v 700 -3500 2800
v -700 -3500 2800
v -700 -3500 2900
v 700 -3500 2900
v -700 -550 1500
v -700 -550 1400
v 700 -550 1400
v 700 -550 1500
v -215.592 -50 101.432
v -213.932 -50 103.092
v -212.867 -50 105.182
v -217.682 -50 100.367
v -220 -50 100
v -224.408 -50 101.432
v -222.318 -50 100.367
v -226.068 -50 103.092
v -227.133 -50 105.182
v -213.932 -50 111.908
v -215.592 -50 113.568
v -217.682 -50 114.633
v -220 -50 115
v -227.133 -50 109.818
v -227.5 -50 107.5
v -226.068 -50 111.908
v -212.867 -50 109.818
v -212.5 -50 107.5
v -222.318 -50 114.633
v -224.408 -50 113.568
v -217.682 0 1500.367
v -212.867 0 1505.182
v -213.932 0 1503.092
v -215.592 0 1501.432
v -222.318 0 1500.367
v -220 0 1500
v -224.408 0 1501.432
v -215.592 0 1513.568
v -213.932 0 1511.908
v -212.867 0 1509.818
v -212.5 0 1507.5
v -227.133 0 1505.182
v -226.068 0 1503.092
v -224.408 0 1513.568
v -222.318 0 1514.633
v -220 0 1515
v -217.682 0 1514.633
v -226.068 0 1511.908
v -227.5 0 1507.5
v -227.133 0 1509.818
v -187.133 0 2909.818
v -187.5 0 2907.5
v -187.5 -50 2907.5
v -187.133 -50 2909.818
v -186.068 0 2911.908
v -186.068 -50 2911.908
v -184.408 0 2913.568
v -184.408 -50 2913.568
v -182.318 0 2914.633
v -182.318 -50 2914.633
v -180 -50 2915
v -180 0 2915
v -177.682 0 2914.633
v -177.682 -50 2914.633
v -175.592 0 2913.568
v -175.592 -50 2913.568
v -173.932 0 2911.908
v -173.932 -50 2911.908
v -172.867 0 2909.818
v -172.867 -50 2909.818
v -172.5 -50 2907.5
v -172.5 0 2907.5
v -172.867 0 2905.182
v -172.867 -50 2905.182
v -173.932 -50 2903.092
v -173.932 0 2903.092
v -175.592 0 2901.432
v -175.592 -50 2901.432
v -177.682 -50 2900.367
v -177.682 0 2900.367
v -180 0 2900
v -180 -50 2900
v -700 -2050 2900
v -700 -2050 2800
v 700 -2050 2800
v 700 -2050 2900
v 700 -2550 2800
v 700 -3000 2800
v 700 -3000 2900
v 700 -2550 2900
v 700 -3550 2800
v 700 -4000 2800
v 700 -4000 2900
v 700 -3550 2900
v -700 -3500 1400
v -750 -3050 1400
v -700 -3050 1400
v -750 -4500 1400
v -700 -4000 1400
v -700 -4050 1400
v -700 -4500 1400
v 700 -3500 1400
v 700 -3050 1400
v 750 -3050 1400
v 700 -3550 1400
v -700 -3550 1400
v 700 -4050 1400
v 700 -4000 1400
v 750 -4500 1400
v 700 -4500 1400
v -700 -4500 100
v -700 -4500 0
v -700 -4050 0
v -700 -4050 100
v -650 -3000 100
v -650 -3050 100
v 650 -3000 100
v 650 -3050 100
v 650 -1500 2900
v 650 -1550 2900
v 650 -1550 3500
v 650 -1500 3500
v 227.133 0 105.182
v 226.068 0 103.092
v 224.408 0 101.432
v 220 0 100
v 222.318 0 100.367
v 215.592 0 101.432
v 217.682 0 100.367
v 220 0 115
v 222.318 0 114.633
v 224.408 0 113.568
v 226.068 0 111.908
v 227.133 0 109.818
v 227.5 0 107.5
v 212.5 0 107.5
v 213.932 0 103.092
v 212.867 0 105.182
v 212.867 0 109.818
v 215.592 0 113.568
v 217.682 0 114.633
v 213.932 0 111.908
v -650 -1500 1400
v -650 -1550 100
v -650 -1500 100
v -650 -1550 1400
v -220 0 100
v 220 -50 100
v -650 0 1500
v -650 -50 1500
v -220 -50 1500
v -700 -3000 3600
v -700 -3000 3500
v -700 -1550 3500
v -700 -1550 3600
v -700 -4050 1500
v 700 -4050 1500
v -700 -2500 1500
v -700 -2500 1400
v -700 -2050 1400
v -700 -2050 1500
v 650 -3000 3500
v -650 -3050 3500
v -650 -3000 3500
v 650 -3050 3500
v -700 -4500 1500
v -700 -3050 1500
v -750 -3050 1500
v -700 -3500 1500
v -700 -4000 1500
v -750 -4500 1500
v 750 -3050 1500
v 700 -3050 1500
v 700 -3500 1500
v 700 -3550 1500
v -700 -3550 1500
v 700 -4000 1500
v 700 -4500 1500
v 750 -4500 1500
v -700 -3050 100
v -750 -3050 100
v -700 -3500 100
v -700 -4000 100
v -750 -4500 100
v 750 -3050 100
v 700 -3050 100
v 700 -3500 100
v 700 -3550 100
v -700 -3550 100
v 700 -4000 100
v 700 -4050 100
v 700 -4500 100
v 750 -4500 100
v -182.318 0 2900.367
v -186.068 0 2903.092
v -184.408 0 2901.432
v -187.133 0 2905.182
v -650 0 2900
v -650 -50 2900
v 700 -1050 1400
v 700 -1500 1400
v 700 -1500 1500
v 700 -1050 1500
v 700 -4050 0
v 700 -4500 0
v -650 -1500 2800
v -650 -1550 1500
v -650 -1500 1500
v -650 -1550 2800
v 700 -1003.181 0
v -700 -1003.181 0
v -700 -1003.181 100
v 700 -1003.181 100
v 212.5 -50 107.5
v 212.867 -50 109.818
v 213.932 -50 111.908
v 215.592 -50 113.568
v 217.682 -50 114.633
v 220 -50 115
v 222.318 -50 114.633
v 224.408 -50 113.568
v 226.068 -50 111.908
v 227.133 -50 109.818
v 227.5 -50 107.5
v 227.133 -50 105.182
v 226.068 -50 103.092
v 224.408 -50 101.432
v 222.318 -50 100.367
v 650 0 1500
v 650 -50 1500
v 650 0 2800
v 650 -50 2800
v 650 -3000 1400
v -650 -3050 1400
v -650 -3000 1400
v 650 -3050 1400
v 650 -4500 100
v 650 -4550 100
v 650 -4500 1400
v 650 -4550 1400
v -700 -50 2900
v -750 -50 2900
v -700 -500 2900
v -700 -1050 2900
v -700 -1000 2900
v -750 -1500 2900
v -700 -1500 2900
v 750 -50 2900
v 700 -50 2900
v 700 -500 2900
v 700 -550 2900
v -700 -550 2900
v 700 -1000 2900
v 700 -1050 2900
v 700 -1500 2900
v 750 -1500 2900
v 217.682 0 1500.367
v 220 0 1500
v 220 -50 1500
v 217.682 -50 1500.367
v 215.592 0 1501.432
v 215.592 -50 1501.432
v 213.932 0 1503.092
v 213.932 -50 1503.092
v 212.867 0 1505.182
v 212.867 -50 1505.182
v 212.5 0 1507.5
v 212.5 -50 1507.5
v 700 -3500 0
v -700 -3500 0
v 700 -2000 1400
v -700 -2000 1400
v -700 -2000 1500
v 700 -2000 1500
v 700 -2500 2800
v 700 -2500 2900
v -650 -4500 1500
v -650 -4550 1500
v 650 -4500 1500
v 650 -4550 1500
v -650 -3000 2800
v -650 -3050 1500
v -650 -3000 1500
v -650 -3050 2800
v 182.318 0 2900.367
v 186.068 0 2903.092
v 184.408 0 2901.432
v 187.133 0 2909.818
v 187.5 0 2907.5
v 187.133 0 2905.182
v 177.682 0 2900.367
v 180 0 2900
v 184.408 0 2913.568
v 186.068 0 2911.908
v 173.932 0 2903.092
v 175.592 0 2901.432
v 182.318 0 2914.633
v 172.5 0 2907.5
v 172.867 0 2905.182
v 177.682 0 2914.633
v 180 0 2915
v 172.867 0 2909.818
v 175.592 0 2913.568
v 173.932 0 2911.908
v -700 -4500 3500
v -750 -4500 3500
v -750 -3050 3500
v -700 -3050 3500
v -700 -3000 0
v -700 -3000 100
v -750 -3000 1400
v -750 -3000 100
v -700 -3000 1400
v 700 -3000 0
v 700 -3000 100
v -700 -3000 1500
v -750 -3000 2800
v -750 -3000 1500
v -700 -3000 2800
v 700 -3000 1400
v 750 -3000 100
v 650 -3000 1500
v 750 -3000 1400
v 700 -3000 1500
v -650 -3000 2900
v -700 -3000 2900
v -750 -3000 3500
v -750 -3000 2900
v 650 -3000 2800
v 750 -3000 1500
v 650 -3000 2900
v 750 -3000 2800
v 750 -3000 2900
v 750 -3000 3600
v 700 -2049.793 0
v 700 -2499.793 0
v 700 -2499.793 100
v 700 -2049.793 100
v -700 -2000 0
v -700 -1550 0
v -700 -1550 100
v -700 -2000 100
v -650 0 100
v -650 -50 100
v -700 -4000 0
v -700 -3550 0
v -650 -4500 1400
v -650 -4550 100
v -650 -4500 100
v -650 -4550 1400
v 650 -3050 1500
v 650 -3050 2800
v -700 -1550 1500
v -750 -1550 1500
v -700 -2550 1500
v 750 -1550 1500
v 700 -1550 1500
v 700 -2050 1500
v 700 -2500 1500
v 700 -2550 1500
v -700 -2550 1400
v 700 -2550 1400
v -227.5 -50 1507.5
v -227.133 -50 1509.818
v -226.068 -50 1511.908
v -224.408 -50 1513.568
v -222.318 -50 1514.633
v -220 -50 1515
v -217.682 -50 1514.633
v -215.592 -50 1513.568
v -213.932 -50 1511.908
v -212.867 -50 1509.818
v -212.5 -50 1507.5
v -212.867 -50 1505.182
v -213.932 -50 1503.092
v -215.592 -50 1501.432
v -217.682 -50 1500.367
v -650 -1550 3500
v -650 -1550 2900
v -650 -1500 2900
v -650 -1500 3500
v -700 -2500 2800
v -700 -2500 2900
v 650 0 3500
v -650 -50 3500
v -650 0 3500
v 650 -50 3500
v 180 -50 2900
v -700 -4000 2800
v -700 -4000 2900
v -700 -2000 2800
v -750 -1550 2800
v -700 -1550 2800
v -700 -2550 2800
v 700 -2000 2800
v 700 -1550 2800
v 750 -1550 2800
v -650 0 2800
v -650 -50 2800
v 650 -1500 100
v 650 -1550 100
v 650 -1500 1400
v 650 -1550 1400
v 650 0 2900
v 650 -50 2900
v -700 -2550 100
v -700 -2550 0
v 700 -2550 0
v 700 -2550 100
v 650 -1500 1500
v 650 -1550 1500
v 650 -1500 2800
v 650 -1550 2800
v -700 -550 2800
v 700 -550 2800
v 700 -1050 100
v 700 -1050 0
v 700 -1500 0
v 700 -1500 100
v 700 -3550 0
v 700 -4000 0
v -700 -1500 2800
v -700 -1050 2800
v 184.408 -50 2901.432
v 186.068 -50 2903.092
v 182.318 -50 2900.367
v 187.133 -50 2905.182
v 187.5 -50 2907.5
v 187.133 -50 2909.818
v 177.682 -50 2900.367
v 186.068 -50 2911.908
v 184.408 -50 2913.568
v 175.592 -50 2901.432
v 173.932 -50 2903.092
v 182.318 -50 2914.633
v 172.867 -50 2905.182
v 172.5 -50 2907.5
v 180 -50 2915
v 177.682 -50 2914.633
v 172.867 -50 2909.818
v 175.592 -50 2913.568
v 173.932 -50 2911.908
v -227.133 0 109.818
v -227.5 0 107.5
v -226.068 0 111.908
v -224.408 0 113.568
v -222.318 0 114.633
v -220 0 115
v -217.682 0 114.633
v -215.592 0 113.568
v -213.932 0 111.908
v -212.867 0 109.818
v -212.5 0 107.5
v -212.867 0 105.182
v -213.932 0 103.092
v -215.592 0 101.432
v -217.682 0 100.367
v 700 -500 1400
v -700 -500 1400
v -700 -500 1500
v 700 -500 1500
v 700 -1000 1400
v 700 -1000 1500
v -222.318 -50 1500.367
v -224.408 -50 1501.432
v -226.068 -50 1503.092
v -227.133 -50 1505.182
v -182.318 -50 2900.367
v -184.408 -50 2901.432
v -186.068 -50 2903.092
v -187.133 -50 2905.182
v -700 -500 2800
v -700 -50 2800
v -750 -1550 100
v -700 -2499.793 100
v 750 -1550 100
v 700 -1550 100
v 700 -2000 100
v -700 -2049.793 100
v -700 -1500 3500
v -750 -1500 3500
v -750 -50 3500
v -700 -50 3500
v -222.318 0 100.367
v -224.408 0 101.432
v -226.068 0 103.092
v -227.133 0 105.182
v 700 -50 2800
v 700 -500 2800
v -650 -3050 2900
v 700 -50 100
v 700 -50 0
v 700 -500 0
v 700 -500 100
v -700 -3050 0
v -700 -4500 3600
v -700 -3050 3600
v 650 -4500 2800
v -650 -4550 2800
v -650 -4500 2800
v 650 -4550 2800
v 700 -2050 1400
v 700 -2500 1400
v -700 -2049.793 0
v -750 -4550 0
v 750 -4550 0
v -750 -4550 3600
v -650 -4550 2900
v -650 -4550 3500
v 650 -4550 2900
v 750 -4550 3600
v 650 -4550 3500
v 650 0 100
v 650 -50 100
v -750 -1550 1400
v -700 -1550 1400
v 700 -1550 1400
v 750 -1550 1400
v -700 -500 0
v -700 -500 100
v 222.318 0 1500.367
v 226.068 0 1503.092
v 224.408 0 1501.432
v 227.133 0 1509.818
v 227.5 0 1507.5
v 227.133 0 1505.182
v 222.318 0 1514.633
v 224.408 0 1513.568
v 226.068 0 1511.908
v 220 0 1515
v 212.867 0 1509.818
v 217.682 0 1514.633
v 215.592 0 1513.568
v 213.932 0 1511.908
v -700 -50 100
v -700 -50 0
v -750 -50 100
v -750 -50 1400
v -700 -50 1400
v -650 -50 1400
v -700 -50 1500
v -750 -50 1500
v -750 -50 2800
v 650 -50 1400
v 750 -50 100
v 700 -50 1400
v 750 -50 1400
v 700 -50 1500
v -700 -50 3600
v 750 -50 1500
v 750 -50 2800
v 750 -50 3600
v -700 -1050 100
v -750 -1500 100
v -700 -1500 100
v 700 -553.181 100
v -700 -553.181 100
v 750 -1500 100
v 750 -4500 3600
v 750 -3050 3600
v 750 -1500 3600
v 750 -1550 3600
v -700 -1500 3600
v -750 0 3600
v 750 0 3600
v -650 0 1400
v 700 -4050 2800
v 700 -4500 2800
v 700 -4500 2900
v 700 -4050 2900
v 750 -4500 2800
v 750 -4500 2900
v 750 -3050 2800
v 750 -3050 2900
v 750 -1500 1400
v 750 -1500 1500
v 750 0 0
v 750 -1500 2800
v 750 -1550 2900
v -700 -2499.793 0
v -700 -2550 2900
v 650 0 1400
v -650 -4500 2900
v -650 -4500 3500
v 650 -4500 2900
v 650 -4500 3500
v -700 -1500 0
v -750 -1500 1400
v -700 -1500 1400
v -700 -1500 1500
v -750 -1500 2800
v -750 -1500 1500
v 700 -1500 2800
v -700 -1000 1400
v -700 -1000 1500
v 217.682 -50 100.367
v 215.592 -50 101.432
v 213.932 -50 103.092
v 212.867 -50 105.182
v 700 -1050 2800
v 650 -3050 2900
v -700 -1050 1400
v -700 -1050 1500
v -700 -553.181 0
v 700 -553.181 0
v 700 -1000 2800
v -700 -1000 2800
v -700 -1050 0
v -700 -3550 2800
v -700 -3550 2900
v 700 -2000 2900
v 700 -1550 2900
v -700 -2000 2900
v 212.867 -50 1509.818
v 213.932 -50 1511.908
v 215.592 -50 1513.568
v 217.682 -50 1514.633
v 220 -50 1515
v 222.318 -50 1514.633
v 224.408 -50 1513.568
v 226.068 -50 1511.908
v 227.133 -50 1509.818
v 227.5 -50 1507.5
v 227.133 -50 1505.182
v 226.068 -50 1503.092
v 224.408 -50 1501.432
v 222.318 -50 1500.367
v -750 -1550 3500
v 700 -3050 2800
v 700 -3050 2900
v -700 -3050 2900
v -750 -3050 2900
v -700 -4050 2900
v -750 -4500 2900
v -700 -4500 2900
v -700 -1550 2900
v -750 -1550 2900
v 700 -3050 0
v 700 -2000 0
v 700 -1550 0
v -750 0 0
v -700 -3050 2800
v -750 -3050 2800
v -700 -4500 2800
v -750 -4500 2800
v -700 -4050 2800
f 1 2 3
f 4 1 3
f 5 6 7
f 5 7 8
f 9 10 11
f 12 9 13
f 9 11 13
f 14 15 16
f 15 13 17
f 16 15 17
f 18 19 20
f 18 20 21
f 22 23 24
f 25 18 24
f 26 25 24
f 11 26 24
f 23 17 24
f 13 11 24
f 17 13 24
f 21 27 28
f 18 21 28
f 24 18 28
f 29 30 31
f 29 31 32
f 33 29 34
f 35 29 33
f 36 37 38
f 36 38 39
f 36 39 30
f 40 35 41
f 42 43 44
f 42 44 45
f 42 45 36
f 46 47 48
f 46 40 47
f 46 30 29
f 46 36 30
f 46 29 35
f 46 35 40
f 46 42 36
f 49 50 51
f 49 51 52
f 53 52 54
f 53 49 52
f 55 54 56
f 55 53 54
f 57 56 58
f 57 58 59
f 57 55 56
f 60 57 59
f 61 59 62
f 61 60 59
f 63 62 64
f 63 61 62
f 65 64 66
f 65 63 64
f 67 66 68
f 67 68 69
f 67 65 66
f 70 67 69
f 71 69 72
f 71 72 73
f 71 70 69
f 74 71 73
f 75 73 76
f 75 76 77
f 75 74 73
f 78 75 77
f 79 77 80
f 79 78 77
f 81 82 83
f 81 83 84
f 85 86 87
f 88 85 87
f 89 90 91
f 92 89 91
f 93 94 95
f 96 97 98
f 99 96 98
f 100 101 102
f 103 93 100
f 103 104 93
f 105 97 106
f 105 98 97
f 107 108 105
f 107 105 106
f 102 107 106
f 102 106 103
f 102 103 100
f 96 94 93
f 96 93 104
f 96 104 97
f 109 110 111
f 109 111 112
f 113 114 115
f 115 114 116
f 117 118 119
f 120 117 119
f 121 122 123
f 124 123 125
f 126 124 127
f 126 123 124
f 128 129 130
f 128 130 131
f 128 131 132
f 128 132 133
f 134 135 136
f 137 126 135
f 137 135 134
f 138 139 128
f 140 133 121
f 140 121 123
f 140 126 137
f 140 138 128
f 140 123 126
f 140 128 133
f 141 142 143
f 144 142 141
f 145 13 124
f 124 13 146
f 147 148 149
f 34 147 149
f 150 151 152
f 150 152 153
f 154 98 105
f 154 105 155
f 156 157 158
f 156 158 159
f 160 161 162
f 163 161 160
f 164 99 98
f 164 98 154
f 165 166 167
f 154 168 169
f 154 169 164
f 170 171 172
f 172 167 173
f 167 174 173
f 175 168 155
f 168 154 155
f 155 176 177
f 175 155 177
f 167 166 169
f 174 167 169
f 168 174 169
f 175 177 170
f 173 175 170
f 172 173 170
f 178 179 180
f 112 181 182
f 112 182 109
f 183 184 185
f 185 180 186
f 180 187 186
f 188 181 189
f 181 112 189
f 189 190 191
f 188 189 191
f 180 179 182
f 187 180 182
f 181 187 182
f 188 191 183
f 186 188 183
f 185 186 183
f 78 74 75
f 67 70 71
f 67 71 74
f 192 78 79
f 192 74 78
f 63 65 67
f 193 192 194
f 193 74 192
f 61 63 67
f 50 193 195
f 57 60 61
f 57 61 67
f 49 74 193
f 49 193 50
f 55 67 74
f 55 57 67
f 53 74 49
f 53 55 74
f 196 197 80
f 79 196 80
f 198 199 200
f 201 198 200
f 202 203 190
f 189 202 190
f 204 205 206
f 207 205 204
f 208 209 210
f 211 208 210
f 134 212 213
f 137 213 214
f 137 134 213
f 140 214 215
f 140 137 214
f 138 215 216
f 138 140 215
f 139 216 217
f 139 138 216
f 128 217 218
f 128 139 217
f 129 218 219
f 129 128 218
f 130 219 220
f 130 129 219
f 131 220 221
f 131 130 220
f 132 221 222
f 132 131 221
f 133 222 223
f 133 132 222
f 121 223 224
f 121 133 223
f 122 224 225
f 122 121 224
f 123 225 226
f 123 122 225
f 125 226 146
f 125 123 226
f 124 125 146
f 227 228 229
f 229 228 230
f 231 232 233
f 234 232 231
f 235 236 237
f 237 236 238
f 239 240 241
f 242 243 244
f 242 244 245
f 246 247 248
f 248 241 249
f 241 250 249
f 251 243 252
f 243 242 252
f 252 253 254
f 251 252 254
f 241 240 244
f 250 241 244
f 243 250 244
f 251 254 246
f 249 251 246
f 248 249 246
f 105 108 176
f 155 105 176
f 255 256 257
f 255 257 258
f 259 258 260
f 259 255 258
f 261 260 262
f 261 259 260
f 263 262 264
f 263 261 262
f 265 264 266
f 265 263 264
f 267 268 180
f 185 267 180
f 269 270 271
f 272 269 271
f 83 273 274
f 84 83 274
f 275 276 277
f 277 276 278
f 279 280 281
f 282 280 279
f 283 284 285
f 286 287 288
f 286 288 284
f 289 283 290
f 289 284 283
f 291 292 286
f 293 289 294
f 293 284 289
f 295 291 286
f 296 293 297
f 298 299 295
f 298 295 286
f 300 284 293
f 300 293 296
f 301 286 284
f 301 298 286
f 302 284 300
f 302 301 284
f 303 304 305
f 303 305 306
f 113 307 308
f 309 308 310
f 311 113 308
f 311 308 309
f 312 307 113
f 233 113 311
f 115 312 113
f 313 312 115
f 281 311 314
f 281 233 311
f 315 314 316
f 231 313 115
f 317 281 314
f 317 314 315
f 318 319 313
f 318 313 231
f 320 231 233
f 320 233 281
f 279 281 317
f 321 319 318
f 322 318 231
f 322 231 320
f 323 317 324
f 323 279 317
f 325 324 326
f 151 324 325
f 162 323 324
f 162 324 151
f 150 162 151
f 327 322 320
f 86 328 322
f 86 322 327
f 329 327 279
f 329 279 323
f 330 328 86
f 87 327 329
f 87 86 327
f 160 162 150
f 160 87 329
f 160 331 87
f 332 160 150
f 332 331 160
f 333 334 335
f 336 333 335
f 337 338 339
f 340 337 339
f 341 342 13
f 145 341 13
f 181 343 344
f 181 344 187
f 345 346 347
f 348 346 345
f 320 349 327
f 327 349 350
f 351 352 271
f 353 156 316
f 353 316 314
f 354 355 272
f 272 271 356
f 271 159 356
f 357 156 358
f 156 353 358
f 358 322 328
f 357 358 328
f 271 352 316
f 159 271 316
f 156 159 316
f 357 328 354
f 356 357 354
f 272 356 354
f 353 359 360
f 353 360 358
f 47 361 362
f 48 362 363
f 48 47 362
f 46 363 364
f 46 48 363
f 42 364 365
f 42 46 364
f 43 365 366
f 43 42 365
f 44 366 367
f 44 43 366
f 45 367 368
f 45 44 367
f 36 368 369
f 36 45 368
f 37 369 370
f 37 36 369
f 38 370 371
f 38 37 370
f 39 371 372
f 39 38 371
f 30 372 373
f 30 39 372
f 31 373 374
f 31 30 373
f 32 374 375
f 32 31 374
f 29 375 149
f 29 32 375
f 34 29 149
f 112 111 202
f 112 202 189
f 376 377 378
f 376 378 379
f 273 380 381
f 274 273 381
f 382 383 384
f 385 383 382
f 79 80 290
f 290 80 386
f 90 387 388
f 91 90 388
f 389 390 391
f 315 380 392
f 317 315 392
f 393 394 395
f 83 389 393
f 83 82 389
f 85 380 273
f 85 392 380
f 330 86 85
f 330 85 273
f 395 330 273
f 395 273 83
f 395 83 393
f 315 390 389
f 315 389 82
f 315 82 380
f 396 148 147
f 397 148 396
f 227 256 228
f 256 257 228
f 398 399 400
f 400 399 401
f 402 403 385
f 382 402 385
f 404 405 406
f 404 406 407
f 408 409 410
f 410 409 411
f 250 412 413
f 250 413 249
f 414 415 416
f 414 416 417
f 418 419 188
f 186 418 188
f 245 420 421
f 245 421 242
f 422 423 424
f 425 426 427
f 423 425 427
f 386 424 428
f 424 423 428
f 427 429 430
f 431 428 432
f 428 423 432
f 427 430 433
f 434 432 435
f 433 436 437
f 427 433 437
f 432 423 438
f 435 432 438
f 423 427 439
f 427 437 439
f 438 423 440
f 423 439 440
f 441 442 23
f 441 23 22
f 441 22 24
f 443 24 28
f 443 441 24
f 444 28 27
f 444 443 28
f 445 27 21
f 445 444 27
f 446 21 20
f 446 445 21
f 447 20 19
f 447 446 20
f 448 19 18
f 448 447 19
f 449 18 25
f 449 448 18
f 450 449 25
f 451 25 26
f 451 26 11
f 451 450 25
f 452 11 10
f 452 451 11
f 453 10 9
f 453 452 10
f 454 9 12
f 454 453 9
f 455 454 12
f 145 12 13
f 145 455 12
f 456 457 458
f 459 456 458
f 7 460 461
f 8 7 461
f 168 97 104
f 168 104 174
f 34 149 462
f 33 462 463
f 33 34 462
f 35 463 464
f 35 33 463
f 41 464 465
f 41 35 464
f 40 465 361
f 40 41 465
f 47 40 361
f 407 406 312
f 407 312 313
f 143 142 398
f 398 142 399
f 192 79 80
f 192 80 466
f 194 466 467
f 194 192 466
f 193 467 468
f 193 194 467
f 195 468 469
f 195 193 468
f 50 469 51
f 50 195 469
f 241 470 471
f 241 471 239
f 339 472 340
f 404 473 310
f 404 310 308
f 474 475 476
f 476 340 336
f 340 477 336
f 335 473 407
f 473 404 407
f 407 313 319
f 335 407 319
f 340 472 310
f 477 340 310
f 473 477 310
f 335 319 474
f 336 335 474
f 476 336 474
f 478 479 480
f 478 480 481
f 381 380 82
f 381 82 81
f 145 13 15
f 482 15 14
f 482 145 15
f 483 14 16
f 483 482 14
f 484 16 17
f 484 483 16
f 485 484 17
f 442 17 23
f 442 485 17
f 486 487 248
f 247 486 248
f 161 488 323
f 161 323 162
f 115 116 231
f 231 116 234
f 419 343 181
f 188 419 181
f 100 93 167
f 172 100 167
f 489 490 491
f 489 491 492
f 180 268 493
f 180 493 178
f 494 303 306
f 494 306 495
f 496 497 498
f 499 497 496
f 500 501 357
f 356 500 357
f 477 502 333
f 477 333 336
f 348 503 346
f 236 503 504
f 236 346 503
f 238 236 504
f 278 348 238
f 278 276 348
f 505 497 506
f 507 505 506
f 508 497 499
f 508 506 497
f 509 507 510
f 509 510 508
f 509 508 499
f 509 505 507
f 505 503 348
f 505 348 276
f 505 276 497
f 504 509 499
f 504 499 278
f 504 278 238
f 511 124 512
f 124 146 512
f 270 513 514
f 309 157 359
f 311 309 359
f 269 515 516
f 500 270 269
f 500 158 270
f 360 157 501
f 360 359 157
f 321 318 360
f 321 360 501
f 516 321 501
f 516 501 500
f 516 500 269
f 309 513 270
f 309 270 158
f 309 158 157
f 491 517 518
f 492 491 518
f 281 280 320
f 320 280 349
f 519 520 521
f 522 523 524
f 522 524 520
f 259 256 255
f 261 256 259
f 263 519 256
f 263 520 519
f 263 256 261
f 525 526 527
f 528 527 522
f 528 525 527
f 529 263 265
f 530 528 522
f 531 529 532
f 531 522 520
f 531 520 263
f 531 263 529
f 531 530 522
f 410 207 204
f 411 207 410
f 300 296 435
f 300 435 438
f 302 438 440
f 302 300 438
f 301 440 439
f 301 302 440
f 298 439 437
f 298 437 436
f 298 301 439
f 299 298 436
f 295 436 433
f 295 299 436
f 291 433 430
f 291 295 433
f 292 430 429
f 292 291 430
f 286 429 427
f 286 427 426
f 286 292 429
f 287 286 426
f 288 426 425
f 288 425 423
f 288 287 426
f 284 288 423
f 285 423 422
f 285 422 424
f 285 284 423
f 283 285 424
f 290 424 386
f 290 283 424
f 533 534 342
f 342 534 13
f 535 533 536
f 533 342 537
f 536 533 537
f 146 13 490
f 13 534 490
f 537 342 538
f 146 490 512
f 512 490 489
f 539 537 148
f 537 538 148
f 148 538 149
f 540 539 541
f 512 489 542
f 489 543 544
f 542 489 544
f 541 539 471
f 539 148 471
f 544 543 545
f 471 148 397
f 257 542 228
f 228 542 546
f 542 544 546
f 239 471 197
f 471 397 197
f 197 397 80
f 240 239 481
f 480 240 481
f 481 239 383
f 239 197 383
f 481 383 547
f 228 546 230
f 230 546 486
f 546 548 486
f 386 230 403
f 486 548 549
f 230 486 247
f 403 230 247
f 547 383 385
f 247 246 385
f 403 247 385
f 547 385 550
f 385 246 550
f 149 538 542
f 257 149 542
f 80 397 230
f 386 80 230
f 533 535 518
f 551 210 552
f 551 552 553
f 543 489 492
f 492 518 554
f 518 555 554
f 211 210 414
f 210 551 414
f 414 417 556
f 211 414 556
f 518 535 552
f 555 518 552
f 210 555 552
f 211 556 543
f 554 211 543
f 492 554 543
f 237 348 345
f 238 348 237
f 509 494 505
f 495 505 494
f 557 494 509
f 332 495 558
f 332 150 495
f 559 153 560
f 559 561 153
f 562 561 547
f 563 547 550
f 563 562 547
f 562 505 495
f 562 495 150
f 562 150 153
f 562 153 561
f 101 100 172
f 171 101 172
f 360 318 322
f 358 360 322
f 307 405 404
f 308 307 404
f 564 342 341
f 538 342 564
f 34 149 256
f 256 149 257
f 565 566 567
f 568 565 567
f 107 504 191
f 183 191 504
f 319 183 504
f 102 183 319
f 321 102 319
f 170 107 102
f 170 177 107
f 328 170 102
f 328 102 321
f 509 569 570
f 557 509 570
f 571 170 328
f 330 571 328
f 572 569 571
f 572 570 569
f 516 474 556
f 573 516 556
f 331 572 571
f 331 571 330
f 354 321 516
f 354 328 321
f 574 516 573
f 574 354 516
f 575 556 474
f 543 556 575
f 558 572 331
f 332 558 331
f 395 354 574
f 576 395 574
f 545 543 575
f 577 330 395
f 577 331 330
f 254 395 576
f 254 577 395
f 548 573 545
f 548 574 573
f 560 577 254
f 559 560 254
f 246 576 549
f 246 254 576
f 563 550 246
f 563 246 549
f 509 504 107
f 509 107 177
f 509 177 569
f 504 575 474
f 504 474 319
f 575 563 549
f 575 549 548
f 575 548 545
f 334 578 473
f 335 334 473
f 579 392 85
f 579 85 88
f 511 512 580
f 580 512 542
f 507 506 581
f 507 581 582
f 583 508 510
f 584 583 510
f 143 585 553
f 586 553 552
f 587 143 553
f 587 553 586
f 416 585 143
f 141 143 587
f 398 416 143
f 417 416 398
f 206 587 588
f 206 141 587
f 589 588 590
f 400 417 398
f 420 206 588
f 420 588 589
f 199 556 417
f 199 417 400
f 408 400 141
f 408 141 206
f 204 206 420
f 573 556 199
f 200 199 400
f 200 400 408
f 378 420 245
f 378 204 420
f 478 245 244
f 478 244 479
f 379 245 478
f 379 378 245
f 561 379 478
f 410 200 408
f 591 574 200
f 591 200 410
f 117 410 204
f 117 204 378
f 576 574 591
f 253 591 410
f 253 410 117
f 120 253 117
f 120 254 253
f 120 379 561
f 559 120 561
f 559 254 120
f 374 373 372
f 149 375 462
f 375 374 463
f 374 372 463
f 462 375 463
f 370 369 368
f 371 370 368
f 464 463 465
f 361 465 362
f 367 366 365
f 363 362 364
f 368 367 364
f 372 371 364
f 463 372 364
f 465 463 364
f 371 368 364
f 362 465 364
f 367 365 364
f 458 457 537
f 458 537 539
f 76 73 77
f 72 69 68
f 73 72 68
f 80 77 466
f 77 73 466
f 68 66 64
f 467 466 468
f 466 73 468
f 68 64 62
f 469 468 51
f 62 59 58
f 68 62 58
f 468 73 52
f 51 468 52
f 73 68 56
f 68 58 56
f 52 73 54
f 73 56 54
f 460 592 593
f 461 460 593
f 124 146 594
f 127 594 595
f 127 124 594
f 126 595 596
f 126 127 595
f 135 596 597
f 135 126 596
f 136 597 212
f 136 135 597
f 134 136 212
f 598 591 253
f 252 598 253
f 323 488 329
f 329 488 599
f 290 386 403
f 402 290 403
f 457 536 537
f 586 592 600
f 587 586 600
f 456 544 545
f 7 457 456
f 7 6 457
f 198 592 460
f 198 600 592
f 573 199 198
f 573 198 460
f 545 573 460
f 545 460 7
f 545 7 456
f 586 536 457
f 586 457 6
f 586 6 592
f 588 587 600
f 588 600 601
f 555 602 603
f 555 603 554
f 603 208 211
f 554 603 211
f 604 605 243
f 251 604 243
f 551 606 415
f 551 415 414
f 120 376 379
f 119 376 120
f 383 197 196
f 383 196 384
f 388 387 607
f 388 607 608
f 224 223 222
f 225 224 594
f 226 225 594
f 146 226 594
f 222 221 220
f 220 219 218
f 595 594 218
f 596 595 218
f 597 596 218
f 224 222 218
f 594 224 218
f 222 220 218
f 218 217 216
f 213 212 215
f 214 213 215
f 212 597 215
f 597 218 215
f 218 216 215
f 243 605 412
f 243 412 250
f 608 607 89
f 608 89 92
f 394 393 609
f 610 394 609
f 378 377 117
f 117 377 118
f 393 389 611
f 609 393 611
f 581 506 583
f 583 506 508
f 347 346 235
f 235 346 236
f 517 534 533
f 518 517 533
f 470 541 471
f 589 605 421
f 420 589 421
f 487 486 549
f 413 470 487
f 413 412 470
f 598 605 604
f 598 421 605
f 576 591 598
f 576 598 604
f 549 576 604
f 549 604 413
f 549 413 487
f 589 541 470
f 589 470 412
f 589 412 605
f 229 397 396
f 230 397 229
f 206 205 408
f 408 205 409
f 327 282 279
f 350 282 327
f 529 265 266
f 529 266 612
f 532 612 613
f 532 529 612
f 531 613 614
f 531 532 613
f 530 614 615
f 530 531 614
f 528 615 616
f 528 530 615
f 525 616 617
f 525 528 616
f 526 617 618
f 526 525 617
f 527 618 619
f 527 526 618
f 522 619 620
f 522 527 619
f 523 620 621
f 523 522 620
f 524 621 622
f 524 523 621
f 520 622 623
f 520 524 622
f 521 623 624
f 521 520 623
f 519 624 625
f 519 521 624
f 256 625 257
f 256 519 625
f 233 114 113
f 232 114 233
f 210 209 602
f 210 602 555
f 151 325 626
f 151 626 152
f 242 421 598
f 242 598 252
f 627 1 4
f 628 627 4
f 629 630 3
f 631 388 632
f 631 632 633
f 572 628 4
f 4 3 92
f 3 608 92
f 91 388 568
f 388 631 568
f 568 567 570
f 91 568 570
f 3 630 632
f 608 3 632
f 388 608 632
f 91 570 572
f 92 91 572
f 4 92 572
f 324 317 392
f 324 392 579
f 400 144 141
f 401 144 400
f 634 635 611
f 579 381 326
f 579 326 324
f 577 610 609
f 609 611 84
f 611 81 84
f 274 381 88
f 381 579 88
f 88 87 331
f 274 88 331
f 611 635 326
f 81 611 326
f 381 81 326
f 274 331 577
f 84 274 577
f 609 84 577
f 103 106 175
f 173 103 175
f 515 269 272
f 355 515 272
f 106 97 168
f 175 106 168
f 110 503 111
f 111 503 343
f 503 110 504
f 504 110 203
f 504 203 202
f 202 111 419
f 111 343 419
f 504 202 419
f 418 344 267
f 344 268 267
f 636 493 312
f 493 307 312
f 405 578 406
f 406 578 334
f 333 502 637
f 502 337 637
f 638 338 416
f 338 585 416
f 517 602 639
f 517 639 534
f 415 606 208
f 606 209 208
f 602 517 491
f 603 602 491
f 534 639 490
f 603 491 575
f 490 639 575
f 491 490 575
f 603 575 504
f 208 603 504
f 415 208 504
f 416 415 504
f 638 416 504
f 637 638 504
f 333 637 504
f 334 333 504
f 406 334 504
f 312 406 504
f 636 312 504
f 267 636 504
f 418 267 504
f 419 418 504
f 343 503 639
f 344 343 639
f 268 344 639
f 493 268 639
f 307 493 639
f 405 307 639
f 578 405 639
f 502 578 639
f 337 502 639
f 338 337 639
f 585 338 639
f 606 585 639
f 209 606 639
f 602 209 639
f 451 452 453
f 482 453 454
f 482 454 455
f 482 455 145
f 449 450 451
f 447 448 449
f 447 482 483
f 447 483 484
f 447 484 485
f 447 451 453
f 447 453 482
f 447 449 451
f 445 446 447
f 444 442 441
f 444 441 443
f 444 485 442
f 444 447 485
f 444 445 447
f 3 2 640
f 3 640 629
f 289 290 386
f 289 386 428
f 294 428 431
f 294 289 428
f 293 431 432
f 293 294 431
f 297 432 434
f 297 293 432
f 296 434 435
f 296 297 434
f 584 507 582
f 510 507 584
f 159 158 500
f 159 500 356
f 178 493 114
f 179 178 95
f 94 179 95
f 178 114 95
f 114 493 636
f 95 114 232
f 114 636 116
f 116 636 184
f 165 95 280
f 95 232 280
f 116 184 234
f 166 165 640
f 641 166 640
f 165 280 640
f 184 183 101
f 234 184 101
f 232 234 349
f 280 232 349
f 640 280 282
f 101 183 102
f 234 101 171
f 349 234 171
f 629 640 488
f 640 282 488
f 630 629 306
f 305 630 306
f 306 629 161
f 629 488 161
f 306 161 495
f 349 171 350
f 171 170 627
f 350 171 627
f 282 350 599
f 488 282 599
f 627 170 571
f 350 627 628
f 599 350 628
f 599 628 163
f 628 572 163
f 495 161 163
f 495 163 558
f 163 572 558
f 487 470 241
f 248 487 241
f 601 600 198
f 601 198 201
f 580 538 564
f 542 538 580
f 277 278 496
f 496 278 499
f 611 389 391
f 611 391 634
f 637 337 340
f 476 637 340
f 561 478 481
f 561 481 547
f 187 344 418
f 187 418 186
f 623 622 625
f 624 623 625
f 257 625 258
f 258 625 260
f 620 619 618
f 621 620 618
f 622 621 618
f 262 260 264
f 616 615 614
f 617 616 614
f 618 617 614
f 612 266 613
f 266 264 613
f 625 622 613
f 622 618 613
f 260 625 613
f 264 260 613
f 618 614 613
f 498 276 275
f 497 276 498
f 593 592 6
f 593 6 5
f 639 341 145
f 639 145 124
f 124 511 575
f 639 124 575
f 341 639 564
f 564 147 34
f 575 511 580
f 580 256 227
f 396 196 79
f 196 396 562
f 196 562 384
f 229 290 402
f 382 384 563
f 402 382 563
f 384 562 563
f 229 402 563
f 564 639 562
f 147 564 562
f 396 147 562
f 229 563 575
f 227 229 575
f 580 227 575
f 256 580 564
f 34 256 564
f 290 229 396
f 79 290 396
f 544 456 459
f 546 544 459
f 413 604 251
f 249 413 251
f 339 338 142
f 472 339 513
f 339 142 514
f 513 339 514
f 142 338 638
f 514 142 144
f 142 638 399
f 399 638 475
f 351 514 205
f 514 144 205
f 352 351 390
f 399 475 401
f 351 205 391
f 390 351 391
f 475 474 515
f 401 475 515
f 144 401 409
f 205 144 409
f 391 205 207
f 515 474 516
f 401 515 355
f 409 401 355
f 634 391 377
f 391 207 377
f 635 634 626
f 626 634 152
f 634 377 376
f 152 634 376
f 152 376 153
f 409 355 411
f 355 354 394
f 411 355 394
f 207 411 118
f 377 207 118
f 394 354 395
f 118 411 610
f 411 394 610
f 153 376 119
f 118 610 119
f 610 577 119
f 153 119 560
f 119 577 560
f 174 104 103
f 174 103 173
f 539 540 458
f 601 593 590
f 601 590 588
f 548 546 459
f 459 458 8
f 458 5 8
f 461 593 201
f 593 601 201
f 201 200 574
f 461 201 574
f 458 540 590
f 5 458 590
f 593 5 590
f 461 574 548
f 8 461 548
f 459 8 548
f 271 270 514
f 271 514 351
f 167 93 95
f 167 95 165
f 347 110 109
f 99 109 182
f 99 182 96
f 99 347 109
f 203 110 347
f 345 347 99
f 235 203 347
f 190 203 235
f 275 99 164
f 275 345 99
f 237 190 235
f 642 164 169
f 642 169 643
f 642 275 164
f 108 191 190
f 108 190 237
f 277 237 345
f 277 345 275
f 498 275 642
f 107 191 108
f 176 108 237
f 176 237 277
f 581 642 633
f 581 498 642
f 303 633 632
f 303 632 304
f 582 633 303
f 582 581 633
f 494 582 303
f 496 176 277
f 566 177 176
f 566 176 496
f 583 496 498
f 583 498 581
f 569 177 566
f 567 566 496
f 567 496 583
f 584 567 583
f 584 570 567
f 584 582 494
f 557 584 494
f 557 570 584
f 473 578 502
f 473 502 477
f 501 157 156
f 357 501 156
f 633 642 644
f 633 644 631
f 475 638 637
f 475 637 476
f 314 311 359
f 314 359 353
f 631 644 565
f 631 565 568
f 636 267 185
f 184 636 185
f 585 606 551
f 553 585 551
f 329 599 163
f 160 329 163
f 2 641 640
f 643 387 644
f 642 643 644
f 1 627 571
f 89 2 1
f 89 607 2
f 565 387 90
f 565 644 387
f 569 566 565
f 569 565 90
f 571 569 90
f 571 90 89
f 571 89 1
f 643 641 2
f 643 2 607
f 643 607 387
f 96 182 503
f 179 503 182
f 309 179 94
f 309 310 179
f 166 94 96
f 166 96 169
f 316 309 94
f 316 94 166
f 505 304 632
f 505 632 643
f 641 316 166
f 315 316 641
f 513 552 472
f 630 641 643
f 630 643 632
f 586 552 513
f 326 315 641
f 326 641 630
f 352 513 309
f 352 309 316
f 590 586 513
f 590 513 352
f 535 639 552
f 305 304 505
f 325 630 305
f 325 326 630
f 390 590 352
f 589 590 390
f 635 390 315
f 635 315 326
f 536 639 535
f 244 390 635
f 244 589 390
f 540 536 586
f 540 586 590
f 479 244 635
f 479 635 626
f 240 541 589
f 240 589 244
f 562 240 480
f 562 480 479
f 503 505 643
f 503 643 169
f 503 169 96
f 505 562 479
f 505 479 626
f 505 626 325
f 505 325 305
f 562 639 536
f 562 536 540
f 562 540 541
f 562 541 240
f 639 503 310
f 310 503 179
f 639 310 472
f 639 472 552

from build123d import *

# Parameters (mm, degrees)
F1_W      = 1500
F1_H      = 3600
F2_DEPTH  = 4550
F3_W      = 1300
F3_H      = 1300
F3_H_2    = 600
F4_DEPTH  = 20000
F5_W      = 1450
F5_H      = 4000
F5_H_2    = 4290.098786
F5_H_3    = 4287.803769
F6_DEPTH  = 2000
F7_W      = 50
F7_H      = 100
F8_DEPTH  = 4550
F10_W     = 50
F10_H     = 100
F10_W_2   = 50.206947
F10_W_3   = 49.793053
F10_W_4   = 46.819377
F10_W_5   = 53.180623
F11_DEPTH = 1500
F9_R      = 7.5
F12_DEPTH = 50


with BuildPart() as f2:
    # F1 (on Front) → F2 (new body)
    with BuildSketch(Plane.XZ):
        with Locations((0, 1800)):
            Rectangle(F1_W, F1_H)
    extrude(amount=F2_DEPTH)

    # F3 (on face) → F4 (cut)
    with BuildSketch(Plane.XZ.offset(4550)):
        with Locations((0, 750)):
            Rectangle(F3_W, F3_H)
        with Locations((0, 2150)):
            Rectangle(F3_W, F3_H)
        with Locations((0, 3200)):
            Rectangle(F3_W, F3_H_2)
    extrude(amount=-F4_DEPTH, mode=Mode.SUBTRACT)

    # F5 (on face) → F6 (cut)
    with BuildSketch(Plane.YZ.offset(750)):
        with Locations((-775, 2000)):
            Rectangle(F5_W, F5_H)
        with Locations((-2275, 1869.349897)):
            Rectangle(F5_W, F5_H_2)
        with Locations((-3775, 1868.202388)):
            Rectangle(F5_W, F5_H_3)
    extrude(amount=-F6_DEPTH, mode=Mode.SUBTRACT)

    # F7 (on face) → F8 (join)
    with BuildSketch(Plane.XZ.offset(4550)):
        with Locations((725, 1450)):
            Rectangle(F7_W, F7_H)
        with Locations((-725, 3550)):
            Rectangle(F7_W, F7_H)
        with Locations((-725, 2850)):
            Rectangle(F7_W, F7_H)
        with Locations((-725, 1450)):
            Rectangle(F7_W, F7_H)
        with Locations((-725, 50)):
            Rectangle(F7_W, F7_H)
        with Locations((725, 50)):
            Rectangle(F7_W, F7_H)
        with Locations((725, 2850)):
            Rectangle(F7_W, F7_H)
    extrude(amount=-F8_DEPTH)

    # F10 (on face) → F11 (join)
    with BuildSketch(Plane.YZ.offset(750)):
        with Locations((-4025, 2850)):
            Rectangle(F10_W, F10_H)
        with Locations((-3525, 2850)):
            Rectangle(F10_W, F10_H)
        with Locations((-2525, 2850)):
            Rectangle(F10_W, F10_H)
        with Locations((-2025, 2850)):
            Rectangle(F10_W, F10_H)
        with Locations((-1025, 2850)):
            Rectangle(F10_W, F10_H)
        with Locations((-525, 2850)):
            Rectangle(F10_W, F10_H)
        with Locations((-4025, 1450)):
            Rectangle(F10_W, F10_H)
        with Locations((-3525, 1450)):
            Rectangle(F10_W, F10_H)
        with Locations((-2525, 1450)):
            Rectangle(F10_W, F10_H)
        with Locations((-2025, 1450)):
            Rectangle(F10_W, F10_H)
        with Locations((-1025, 1450)):
            Rectangle(F10_W, F10_H)
        with Locations((-525, 1450)):
            Rectangle(F10_W, F10_H)
        with Locations((-4025, 50)):
            Rectangle(F10_W, F10_H)
        with Locations((-3525, 50)):
            Rectangle(F10_W, F10_H)
        with Locations((-2524.896526, 50)):
            Rectangle(F10_W_2, F10_H)
        with Locations((-2024.896526, 50)):
            Rectangle(F10_W_3, F10_H)
        with Locations((-1026.590312, 50)):
            Rectangle(F10_W_4, F10_H)
        with Locations((-526.590311, 50)):
            Rectangle(F10_W_5, F10_H)
    extrude(amount=-F11_DEPTH)

    # F9 (on face) → F12 (join)
    with BuildSketch(Plane(origin=(0, 0, 0), x_dir=(-1, 0, 0), z_dir=(0, 1, 0))):
        with Locations((-180, 2907.5)):
            Circle(F9_R)
        with Locations((220, 1507.5)):
            Circle(F9_R)
        with Locations((-220, 1507.5)):
            Circle(F9_R)
        with Locations((220, 107.5)):
            Circle(F9_R)
        with Locations((-220, 107.5)):
            Circle(F9_R)
        with Locations((180, 2907.5)):
            Circle(F9_R)
    extrude(amount=-F12_DEPTH)


solid = f2.part
